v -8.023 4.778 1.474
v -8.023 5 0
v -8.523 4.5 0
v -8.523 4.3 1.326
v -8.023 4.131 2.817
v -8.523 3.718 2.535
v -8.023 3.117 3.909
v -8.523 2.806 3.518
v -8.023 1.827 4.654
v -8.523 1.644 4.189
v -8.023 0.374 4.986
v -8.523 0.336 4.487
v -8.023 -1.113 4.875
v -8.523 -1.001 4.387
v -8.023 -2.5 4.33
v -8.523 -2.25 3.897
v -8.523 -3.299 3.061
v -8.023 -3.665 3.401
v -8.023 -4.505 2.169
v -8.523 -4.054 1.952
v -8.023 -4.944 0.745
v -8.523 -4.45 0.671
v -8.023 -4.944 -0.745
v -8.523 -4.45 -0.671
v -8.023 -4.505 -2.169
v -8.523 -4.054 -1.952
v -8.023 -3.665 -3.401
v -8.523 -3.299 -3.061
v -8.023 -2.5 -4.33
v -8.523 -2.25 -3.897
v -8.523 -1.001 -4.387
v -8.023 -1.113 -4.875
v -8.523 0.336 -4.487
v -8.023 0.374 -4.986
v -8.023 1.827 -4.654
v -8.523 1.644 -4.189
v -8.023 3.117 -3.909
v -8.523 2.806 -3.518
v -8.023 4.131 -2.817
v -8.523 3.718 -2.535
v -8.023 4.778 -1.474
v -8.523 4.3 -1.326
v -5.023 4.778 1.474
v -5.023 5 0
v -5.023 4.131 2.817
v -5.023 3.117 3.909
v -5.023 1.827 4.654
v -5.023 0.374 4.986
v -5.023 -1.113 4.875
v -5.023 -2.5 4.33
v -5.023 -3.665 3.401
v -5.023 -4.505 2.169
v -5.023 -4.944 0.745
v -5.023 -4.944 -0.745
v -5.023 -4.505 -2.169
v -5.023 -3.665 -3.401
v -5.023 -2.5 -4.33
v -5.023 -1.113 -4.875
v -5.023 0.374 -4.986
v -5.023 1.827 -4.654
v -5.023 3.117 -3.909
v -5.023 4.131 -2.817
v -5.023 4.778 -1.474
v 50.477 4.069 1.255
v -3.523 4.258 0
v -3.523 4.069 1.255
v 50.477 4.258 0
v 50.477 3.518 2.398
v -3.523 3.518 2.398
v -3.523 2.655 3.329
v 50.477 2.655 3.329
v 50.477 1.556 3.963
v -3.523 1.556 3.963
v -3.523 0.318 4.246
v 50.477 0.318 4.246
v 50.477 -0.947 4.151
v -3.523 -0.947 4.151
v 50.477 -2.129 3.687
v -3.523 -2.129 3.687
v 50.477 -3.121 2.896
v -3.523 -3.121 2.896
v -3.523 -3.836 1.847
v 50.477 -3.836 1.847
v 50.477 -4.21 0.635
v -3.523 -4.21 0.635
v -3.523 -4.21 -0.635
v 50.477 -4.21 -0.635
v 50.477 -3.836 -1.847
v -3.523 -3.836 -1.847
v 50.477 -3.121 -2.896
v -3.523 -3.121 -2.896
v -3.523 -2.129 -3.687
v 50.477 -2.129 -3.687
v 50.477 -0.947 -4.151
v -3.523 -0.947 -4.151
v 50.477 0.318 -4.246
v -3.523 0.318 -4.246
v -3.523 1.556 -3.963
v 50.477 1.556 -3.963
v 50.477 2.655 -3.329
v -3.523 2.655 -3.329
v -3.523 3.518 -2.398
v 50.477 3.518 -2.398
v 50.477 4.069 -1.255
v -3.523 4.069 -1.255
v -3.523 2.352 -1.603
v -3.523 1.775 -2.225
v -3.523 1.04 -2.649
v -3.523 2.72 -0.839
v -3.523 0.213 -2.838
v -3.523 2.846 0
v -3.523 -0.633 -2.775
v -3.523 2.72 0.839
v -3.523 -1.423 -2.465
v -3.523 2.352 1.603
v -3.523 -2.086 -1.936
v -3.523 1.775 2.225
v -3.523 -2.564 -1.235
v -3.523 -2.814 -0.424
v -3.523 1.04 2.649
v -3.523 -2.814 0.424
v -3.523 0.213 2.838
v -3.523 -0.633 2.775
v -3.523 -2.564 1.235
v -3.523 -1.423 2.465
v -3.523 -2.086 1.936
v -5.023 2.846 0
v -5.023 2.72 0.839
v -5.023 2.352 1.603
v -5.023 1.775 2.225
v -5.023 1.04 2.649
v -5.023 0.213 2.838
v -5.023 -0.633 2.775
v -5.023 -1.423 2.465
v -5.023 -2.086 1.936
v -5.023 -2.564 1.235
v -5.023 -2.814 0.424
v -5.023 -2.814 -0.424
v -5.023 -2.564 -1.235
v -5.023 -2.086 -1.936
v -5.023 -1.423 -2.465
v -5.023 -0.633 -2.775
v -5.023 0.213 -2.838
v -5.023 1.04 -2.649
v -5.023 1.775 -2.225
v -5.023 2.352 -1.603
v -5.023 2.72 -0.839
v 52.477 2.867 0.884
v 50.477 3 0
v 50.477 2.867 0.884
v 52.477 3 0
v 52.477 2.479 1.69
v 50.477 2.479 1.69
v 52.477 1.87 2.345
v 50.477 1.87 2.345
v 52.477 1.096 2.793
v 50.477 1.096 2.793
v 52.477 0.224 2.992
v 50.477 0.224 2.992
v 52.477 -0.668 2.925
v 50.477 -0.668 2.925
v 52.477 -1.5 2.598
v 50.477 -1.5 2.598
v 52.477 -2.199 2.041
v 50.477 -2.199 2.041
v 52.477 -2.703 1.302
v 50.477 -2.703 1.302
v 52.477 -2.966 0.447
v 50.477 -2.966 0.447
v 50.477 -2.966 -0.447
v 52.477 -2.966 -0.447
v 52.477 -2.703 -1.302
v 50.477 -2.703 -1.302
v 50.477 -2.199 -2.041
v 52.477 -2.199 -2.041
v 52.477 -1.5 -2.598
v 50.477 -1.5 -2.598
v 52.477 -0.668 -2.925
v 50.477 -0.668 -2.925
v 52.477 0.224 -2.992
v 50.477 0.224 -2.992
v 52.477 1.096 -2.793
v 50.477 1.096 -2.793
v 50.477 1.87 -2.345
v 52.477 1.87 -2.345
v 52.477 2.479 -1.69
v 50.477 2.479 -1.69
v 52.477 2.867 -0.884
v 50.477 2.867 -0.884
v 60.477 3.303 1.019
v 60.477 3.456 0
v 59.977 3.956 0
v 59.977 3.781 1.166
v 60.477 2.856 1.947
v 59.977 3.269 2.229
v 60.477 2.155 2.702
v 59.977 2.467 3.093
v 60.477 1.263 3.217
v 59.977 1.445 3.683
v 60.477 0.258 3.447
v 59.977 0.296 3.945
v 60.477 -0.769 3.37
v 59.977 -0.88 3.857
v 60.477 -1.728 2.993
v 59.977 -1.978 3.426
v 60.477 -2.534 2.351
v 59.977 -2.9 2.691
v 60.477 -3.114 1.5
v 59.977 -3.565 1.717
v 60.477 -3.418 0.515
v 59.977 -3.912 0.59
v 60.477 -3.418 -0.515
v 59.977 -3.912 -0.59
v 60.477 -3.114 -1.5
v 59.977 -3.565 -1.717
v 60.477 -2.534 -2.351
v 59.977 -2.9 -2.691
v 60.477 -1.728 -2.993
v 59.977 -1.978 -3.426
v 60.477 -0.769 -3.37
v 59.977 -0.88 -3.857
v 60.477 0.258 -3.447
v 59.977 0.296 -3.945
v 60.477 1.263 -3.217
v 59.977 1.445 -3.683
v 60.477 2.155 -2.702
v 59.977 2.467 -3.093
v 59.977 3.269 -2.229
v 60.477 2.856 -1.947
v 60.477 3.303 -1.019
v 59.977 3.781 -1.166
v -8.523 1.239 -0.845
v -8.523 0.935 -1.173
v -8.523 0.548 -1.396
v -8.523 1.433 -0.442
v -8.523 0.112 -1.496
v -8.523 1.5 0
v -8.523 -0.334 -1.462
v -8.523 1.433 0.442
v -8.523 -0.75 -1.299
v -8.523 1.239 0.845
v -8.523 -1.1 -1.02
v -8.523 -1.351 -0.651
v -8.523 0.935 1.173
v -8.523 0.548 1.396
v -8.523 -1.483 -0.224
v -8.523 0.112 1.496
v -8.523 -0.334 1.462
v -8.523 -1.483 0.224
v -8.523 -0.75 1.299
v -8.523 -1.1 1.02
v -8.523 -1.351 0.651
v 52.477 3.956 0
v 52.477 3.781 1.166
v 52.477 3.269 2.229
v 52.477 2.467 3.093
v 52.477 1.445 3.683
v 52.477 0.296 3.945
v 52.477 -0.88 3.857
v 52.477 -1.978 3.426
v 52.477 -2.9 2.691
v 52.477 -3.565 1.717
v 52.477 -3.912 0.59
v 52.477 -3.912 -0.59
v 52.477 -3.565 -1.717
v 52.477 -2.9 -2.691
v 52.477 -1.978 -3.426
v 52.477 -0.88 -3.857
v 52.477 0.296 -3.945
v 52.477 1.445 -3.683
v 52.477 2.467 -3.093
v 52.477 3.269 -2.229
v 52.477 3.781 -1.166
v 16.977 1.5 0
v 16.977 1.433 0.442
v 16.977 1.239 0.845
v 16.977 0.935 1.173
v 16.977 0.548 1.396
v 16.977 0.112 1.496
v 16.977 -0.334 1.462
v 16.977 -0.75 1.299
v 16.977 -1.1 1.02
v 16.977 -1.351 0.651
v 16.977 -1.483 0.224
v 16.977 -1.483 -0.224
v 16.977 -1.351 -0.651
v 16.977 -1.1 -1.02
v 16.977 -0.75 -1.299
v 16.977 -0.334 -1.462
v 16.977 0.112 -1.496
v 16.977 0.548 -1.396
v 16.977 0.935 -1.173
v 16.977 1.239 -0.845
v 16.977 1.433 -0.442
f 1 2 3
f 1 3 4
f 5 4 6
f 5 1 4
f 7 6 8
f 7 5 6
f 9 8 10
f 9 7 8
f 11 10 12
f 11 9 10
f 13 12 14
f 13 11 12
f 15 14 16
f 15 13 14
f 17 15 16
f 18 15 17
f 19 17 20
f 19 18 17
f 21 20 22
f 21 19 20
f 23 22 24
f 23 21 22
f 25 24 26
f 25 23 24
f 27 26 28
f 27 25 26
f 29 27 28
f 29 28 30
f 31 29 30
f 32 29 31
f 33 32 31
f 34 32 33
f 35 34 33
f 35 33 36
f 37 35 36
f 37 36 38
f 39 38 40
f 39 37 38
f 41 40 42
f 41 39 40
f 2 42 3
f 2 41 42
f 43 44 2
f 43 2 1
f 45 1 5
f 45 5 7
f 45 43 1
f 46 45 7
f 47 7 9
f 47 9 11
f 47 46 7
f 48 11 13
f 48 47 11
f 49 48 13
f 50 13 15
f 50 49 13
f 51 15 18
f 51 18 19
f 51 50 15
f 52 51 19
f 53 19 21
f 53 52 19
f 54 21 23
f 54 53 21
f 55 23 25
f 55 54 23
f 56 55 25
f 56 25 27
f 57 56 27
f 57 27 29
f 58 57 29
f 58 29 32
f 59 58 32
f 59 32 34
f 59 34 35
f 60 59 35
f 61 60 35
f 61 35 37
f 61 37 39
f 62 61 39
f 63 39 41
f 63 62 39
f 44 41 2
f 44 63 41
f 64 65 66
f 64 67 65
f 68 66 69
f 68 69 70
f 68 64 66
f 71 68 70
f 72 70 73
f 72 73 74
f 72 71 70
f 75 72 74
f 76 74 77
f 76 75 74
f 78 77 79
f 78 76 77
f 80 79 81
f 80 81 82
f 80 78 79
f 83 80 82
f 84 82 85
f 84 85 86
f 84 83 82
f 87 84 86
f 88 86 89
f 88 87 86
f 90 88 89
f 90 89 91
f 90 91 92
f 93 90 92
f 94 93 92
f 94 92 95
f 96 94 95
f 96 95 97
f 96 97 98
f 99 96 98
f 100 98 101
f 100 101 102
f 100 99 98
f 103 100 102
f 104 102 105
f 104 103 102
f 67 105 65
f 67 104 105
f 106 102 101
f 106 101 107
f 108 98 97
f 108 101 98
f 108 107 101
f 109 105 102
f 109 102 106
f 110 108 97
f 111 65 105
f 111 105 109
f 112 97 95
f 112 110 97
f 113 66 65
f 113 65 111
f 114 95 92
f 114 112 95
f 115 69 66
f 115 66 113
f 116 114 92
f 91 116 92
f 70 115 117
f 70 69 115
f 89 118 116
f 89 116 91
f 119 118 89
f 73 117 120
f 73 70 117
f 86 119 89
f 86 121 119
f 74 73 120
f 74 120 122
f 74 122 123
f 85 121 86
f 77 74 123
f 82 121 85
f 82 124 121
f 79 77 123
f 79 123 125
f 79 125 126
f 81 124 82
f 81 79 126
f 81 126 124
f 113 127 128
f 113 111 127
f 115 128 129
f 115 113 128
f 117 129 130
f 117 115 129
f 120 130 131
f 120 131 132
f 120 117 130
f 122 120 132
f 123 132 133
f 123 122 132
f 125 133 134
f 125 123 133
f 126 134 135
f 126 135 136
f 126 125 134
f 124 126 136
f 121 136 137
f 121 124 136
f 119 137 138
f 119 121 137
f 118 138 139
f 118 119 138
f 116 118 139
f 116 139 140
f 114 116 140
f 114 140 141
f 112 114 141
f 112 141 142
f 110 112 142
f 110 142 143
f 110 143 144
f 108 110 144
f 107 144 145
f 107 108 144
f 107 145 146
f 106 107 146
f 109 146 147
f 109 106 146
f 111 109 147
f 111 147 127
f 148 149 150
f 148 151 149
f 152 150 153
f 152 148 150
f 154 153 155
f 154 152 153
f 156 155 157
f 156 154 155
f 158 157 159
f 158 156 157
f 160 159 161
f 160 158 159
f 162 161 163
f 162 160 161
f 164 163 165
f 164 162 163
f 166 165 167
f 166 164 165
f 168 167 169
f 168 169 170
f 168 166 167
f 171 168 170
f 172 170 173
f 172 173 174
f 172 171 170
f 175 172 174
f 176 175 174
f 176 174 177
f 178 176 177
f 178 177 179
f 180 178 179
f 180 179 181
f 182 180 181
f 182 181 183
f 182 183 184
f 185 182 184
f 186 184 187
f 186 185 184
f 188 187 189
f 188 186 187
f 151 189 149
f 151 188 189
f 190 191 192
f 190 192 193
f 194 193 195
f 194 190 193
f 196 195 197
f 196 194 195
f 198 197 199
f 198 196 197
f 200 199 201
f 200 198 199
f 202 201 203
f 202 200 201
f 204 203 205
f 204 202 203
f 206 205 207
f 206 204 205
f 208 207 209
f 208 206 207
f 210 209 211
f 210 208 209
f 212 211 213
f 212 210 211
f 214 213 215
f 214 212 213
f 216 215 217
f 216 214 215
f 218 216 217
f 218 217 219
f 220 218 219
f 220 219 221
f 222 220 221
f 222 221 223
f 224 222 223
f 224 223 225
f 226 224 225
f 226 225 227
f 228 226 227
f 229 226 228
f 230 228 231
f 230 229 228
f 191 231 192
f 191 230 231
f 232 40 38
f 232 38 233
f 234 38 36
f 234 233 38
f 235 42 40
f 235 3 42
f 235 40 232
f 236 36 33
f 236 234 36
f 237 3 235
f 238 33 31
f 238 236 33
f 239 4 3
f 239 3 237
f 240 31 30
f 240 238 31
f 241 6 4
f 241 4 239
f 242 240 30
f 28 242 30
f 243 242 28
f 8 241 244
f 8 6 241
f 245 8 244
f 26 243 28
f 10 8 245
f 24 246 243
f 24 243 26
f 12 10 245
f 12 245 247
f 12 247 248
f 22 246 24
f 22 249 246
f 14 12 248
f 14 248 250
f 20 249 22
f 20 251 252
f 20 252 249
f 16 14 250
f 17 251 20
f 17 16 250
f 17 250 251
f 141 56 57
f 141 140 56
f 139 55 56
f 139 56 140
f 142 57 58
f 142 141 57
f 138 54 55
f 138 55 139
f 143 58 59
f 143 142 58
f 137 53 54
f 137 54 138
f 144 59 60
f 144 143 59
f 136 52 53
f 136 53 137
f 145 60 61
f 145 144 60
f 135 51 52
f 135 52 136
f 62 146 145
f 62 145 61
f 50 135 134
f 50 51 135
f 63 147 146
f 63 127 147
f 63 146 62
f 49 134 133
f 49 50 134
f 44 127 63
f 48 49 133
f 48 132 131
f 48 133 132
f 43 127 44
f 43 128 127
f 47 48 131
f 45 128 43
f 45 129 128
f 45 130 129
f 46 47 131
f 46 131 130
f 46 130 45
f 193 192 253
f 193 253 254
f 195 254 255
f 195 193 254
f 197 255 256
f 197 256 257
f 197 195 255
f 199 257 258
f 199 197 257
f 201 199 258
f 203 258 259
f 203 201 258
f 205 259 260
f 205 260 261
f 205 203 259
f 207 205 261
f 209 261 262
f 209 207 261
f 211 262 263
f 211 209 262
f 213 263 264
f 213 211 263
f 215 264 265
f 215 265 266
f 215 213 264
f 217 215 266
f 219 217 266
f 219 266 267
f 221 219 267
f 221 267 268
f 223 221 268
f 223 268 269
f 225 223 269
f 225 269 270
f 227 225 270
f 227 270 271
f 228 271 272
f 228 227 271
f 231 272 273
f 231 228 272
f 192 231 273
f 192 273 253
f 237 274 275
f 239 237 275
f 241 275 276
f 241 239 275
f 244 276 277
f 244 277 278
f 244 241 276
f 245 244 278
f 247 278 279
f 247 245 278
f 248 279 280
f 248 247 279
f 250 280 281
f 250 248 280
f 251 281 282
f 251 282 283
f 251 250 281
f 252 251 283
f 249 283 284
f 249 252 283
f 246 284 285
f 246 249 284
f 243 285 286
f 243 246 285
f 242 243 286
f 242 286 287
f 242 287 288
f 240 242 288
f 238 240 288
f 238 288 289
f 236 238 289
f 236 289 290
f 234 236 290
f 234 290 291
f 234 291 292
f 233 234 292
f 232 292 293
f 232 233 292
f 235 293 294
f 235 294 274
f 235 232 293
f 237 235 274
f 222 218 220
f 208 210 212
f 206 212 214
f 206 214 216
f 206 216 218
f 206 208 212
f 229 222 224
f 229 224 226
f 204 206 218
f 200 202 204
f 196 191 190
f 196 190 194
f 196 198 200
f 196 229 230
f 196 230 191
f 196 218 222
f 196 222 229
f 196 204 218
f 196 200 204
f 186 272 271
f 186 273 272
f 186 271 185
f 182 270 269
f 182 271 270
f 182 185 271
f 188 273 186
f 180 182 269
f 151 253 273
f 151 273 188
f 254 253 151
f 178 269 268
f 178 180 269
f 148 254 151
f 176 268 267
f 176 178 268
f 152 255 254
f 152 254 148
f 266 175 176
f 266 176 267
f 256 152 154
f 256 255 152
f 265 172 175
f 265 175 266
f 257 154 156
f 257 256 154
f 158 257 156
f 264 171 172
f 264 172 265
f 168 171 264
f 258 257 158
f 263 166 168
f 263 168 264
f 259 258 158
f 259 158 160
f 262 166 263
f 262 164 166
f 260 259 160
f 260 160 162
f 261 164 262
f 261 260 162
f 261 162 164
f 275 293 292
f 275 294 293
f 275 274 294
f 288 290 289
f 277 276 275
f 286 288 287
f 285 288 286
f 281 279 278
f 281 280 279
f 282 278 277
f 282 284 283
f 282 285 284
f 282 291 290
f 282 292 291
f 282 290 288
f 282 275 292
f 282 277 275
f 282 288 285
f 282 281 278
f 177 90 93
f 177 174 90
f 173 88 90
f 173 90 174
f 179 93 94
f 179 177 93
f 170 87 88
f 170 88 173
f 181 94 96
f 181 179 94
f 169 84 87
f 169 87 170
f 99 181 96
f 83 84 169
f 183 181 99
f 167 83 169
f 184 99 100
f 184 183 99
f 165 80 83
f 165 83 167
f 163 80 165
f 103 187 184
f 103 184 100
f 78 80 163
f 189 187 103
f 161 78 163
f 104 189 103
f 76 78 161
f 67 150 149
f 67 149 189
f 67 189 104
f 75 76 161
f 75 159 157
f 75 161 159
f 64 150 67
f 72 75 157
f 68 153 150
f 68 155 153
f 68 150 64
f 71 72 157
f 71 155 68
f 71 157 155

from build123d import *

# Parameters (mm, degrees)
CHAMFER1_SIZE = 0.5
CHAMFER2_SIZE = 0.5


with BuildPart() as part:
    # Sketch1 → Revolve1 (revolve)
    with BuildSketch(Plane.XY):
        Polygon((-8.523357549, 1.5), (-8.523357549, 5), (-5.023357549, 5), (-5.023357549, 2.846083032), (-3.523357549, 2.846083032), (-3.523357549, 4.257689054), (50.476642451, 4.257689054), (50.476642451, 3), (52.476642451, 3), (52.476642451, 3.956427418), (60.476642451, 3.956427418), (60.476642451, 0), (16.976642451, 0), (16.976642451, 1.5), align=None)
    revolve(axis=Axis((-14.970386809, 0, 0), (1, 0, 0)))

    # Chamfer1
    chamfer1_edges = [part.edges().sort_by_distance(p)[0] for p in [
        (-8.523357549, -5, 0),
    ]]
    chamfer(chamfer1_edges, length=CHAMFER1_SIZE)

    # Chamfer2
    chamfer2_edges = [part.edges().sort_by_distance(p)[0] for p in [
        (60.476642451, -3.956427418, 0),
    ]]
    chamfer(chamfer2_edges, length=CHAMFER2_SIZE)


solid = part.part
